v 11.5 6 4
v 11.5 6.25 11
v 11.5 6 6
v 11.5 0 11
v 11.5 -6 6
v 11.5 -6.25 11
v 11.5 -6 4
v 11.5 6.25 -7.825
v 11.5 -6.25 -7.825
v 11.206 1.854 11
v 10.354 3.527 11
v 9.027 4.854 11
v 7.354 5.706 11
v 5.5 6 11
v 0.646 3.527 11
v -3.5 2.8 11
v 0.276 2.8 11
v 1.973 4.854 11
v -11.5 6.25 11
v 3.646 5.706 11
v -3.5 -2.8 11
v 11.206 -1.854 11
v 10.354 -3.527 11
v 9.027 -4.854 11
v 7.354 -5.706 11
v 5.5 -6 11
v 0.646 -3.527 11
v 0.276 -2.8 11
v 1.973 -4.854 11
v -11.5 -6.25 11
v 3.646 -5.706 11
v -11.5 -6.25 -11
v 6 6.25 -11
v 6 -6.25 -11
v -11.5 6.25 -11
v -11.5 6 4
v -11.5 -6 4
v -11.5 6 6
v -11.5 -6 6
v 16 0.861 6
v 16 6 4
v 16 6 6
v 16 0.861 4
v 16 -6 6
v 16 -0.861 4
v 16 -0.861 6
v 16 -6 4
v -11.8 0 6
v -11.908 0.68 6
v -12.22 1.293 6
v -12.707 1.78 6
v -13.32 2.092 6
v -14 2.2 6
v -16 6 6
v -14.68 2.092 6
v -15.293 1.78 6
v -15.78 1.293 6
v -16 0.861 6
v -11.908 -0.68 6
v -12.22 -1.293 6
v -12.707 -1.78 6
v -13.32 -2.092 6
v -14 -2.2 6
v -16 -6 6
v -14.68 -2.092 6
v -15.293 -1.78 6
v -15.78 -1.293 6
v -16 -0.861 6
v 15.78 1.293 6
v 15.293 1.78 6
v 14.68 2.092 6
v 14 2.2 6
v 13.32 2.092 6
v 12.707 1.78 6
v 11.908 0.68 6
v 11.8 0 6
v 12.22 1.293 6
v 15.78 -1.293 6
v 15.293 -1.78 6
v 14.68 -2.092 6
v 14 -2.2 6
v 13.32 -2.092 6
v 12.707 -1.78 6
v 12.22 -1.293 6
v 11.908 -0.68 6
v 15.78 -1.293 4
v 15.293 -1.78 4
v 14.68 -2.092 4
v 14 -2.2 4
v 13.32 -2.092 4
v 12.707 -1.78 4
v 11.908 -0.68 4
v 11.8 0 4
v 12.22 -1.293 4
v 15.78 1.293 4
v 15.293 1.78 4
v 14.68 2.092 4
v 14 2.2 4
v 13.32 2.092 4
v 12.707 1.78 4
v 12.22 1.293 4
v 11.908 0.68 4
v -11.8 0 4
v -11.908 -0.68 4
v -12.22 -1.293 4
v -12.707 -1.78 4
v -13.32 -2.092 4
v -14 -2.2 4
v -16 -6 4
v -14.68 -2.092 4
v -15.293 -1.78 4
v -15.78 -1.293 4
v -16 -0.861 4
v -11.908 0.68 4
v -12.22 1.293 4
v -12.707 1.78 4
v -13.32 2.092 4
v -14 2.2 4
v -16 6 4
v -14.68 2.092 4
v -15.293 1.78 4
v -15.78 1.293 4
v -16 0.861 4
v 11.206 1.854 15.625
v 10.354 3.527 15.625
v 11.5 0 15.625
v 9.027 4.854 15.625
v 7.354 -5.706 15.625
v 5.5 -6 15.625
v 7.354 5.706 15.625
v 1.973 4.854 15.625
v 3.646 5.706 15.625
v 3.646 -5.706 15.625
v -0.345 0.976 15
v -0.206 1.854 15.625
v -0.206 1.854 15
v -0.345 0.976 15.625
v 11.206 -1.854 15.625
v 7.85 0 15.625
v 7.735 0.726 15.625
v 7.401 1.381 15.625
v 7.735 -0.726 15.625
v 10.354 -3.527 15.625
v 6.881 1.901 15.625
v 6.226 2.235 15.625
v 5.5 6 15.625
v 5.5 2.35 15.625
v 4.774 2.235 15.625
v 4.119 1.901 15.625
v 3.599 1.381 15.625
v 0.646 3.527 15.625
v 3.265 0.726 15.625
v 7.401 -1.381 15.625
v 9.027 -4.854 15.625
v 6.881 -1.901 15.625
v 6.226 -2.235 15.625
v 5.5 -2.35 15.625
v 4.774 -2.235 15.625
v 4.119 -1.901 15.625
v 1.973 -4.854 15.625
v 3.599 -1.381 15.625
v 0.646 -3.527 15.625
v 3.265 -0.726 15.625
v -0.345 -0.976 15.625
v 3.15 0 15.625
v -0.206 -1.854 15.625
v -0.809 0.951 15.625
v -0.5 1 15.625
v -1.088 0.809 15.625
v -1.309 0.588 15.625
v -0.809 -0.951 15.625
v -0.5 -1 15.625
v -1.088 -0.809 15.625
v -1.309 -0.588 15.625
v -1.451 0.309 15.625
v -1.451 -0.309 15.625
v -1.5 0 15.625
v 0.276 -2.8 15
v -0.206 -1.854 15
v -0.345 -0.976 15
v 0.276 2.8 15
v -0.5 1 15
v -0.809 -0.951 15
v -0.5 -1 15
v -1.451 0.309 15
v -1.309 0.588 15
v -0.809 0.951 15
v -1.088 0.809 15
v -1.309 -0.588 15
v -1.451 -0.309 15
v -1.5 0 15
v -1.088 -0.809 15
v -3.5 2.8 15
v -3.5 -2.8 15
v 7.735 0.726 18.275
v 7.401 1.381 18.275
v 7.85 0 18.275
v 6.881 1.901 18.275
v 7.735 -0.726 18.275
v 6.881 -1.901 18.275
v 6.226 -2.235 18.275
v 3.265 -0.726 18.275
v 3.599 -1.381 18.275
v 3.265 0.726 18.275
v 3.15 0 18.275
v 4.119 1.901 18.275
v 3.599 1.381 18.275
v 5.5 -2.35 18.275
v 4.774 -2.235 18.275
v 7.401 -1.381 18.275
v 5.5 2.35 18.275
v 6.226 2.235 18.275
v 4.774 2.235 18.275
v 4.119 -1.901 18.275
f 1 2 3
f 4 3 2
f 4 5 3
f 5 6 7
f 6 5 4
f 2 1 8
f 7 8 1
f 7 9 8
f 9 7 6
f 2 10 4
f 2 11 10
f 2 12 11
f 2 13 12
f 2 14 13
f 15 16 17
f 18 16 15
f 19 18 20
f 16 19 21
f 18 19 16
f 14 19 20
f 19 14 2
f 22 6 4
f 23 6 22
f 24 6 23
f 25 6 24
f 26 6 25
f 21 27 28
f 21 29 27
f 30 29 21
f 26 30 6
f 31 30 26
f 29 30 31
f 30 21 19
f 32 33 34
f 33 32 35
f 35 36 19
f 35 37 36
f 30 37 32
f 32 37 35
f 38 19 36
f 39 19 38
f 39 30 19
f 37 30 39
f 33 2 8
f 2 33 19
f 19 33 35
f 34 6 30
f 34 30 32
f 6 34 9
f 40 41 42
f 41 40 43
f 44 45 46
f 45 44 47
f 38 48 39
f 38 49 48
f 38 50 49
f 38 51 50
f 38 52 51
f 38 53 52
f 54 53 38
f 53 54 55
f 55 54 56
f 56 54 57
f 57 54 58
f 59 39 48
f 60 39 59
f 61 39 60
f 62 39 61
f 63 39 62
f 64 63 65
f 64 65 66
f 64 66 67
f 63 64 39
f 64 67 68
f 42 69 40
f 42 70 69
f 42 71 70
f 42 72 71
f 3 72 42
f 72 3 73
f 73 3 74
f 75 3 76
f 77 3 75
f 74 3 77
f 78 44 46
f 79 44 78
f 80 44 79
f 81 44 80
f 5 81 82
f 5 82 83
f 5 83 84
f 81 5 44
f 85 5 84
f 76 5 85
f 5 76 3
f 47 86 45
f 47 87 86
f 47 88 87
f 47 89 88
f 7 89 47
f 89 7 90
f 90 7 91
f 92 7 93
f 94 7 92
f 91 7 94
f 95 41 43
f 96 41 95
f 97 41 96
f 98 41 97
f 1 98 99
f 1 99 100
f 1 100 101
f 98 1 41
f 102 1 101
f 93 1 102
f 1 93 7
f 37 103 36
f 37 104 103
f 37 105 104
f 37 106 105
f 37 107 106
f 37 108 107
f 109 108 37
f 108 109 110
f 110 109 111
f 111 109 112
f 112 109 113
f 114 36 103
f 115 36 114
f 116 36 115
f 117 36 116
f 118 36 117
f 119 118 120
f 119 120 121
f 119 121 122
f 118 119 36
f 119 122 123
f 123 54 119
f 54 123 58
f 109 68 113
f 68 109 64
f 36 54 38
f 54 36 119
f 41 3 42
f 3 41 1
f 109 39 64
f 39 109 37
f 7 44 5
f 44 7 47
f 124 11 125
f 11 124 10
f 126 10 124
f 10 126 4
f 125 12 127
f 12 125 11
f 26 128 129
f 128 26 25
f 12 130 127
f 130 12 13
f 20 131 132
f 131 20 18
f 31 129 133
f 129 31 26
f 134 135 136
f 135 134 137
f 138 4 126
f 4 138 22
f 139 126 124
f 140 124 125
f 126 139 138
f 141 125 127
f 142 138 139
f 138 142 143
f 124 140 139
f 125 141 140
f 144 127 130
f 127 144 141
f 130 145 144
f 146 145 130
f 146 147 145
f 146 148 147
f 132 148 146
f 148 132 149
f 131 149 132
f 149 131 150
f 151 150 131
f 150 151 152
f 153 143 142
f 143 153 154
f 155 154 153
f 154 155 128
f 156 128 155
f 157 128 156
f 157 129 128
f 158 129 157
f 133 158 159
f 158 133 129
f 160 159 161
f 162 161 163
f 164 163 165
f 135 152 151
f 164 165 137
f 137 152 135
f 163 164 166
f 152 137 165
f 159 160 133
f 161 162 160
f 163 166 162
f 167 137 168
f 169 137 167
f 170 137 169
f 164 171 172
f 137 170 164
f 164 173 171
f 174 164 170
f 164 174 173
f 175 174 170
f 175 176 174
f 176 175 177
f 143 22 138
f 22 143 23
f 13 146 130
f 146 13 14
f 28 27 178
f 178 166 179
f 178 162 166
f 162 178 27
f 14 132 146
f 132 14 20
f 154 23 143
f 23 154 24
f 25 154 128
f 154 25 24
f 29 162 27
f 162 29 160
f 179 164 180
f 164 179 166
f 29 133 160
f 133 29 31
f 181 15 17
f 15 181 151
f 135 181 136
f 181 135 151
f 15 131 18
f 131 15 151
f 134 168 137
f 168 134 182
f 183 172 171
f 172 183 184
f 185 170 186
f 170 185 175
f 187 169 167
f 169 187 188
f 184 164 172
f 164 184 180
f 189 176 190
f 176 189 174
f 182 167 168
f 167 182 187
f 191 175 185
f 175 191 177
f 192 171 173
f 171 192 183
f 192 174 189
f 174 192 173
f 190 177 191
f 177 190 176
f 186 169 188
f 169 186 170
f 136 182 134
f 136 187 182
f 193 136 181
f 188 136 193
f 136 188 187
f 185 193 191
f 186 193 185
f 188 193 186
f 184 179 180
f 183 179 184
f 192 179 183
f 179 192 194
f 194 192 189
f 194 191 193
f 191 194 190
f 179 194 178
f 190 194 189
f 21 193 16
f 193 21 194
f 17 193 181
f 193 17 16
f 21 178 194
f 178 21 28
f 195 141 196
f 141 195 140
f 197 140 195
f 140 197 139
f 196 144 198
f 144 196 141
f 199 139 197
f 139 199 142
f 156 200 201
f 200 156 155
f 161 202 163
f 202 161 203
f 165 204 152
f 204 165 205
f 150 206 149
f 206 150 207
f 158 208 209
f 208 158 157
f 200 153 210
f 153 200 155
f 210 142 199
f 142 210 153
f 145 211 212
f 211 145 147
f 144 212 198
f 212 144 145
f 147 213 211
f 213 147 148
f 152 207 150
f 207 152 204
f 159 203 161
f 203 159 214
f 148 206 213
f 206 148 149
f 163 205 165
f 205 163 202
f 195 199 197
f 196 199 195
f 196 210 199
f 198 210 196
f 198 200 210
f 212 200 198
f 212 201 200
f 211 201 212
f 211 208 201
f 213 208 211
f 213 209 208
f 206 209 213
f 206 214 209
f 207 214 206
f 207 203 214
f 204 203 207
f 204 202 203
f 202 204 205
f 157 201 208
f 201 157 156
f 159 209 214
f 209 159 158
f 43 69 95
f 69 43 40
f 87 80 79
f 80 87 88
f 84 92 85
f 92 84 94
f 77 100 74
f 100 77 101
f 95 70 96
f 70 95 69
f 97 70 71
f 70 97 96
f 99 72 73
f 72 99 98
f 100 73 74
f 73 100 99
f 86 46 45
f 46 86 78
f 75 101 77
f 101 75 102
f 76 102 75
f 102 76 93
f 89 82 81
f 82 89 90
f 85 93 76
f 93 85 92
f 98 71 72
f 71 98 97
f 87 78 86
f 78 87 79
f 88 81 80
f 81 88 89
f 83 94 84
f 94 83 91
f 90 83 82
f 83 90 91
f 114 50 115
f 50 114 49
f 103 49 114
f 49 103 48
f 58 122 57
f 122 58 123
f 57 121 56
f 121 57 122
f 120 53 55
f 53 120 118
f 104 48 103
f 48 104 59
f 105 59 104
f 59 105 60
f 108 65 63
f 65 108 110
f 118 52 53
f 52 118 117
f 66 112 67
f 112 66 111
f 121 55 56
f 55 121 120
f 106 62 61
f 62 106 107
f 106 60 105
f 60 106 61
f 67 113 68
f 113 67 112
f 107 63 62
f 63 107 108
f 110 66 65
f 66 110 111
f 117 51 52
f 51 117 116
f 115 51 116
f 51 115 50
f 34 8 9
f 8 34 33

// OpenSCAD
//http://www.thingiverse.com/thing:29734/#files

9g_motor();

module 9g_motor(){
	difference(){			
		union(){
			color("steel blue") cube([23,12.5,22], center=true);
			color("steel blue") translate([0,0,5]) cube([32,12,2], center=true);
			color("steel blue") translate([5.5,0,2.75]) cylinder(r=6, h=25.75, $fn=20, center=true);
			color("steel blue") translate([-.5,0,2.75]) cylinder(r=1, h=25.75, $fn=20, center=true);
			color("steel blue") translate([-1,0,2.75]) cube([5,5.6,24.5], center=true);		
			color("white") translate([5.5,0,3.65]) cylinder(r=2.35, h=29.25, $fn=20, center=true);				
		}
		translate([10,0,-11]) rotate([0,-30,0]) cube([8,13,4], center=true);
		for ( hole = [14,-14] ){
			translate([hole,0,5]) cylinder(r=2.2, h=4, $fn=20, center=true);
		}	
	}
}
